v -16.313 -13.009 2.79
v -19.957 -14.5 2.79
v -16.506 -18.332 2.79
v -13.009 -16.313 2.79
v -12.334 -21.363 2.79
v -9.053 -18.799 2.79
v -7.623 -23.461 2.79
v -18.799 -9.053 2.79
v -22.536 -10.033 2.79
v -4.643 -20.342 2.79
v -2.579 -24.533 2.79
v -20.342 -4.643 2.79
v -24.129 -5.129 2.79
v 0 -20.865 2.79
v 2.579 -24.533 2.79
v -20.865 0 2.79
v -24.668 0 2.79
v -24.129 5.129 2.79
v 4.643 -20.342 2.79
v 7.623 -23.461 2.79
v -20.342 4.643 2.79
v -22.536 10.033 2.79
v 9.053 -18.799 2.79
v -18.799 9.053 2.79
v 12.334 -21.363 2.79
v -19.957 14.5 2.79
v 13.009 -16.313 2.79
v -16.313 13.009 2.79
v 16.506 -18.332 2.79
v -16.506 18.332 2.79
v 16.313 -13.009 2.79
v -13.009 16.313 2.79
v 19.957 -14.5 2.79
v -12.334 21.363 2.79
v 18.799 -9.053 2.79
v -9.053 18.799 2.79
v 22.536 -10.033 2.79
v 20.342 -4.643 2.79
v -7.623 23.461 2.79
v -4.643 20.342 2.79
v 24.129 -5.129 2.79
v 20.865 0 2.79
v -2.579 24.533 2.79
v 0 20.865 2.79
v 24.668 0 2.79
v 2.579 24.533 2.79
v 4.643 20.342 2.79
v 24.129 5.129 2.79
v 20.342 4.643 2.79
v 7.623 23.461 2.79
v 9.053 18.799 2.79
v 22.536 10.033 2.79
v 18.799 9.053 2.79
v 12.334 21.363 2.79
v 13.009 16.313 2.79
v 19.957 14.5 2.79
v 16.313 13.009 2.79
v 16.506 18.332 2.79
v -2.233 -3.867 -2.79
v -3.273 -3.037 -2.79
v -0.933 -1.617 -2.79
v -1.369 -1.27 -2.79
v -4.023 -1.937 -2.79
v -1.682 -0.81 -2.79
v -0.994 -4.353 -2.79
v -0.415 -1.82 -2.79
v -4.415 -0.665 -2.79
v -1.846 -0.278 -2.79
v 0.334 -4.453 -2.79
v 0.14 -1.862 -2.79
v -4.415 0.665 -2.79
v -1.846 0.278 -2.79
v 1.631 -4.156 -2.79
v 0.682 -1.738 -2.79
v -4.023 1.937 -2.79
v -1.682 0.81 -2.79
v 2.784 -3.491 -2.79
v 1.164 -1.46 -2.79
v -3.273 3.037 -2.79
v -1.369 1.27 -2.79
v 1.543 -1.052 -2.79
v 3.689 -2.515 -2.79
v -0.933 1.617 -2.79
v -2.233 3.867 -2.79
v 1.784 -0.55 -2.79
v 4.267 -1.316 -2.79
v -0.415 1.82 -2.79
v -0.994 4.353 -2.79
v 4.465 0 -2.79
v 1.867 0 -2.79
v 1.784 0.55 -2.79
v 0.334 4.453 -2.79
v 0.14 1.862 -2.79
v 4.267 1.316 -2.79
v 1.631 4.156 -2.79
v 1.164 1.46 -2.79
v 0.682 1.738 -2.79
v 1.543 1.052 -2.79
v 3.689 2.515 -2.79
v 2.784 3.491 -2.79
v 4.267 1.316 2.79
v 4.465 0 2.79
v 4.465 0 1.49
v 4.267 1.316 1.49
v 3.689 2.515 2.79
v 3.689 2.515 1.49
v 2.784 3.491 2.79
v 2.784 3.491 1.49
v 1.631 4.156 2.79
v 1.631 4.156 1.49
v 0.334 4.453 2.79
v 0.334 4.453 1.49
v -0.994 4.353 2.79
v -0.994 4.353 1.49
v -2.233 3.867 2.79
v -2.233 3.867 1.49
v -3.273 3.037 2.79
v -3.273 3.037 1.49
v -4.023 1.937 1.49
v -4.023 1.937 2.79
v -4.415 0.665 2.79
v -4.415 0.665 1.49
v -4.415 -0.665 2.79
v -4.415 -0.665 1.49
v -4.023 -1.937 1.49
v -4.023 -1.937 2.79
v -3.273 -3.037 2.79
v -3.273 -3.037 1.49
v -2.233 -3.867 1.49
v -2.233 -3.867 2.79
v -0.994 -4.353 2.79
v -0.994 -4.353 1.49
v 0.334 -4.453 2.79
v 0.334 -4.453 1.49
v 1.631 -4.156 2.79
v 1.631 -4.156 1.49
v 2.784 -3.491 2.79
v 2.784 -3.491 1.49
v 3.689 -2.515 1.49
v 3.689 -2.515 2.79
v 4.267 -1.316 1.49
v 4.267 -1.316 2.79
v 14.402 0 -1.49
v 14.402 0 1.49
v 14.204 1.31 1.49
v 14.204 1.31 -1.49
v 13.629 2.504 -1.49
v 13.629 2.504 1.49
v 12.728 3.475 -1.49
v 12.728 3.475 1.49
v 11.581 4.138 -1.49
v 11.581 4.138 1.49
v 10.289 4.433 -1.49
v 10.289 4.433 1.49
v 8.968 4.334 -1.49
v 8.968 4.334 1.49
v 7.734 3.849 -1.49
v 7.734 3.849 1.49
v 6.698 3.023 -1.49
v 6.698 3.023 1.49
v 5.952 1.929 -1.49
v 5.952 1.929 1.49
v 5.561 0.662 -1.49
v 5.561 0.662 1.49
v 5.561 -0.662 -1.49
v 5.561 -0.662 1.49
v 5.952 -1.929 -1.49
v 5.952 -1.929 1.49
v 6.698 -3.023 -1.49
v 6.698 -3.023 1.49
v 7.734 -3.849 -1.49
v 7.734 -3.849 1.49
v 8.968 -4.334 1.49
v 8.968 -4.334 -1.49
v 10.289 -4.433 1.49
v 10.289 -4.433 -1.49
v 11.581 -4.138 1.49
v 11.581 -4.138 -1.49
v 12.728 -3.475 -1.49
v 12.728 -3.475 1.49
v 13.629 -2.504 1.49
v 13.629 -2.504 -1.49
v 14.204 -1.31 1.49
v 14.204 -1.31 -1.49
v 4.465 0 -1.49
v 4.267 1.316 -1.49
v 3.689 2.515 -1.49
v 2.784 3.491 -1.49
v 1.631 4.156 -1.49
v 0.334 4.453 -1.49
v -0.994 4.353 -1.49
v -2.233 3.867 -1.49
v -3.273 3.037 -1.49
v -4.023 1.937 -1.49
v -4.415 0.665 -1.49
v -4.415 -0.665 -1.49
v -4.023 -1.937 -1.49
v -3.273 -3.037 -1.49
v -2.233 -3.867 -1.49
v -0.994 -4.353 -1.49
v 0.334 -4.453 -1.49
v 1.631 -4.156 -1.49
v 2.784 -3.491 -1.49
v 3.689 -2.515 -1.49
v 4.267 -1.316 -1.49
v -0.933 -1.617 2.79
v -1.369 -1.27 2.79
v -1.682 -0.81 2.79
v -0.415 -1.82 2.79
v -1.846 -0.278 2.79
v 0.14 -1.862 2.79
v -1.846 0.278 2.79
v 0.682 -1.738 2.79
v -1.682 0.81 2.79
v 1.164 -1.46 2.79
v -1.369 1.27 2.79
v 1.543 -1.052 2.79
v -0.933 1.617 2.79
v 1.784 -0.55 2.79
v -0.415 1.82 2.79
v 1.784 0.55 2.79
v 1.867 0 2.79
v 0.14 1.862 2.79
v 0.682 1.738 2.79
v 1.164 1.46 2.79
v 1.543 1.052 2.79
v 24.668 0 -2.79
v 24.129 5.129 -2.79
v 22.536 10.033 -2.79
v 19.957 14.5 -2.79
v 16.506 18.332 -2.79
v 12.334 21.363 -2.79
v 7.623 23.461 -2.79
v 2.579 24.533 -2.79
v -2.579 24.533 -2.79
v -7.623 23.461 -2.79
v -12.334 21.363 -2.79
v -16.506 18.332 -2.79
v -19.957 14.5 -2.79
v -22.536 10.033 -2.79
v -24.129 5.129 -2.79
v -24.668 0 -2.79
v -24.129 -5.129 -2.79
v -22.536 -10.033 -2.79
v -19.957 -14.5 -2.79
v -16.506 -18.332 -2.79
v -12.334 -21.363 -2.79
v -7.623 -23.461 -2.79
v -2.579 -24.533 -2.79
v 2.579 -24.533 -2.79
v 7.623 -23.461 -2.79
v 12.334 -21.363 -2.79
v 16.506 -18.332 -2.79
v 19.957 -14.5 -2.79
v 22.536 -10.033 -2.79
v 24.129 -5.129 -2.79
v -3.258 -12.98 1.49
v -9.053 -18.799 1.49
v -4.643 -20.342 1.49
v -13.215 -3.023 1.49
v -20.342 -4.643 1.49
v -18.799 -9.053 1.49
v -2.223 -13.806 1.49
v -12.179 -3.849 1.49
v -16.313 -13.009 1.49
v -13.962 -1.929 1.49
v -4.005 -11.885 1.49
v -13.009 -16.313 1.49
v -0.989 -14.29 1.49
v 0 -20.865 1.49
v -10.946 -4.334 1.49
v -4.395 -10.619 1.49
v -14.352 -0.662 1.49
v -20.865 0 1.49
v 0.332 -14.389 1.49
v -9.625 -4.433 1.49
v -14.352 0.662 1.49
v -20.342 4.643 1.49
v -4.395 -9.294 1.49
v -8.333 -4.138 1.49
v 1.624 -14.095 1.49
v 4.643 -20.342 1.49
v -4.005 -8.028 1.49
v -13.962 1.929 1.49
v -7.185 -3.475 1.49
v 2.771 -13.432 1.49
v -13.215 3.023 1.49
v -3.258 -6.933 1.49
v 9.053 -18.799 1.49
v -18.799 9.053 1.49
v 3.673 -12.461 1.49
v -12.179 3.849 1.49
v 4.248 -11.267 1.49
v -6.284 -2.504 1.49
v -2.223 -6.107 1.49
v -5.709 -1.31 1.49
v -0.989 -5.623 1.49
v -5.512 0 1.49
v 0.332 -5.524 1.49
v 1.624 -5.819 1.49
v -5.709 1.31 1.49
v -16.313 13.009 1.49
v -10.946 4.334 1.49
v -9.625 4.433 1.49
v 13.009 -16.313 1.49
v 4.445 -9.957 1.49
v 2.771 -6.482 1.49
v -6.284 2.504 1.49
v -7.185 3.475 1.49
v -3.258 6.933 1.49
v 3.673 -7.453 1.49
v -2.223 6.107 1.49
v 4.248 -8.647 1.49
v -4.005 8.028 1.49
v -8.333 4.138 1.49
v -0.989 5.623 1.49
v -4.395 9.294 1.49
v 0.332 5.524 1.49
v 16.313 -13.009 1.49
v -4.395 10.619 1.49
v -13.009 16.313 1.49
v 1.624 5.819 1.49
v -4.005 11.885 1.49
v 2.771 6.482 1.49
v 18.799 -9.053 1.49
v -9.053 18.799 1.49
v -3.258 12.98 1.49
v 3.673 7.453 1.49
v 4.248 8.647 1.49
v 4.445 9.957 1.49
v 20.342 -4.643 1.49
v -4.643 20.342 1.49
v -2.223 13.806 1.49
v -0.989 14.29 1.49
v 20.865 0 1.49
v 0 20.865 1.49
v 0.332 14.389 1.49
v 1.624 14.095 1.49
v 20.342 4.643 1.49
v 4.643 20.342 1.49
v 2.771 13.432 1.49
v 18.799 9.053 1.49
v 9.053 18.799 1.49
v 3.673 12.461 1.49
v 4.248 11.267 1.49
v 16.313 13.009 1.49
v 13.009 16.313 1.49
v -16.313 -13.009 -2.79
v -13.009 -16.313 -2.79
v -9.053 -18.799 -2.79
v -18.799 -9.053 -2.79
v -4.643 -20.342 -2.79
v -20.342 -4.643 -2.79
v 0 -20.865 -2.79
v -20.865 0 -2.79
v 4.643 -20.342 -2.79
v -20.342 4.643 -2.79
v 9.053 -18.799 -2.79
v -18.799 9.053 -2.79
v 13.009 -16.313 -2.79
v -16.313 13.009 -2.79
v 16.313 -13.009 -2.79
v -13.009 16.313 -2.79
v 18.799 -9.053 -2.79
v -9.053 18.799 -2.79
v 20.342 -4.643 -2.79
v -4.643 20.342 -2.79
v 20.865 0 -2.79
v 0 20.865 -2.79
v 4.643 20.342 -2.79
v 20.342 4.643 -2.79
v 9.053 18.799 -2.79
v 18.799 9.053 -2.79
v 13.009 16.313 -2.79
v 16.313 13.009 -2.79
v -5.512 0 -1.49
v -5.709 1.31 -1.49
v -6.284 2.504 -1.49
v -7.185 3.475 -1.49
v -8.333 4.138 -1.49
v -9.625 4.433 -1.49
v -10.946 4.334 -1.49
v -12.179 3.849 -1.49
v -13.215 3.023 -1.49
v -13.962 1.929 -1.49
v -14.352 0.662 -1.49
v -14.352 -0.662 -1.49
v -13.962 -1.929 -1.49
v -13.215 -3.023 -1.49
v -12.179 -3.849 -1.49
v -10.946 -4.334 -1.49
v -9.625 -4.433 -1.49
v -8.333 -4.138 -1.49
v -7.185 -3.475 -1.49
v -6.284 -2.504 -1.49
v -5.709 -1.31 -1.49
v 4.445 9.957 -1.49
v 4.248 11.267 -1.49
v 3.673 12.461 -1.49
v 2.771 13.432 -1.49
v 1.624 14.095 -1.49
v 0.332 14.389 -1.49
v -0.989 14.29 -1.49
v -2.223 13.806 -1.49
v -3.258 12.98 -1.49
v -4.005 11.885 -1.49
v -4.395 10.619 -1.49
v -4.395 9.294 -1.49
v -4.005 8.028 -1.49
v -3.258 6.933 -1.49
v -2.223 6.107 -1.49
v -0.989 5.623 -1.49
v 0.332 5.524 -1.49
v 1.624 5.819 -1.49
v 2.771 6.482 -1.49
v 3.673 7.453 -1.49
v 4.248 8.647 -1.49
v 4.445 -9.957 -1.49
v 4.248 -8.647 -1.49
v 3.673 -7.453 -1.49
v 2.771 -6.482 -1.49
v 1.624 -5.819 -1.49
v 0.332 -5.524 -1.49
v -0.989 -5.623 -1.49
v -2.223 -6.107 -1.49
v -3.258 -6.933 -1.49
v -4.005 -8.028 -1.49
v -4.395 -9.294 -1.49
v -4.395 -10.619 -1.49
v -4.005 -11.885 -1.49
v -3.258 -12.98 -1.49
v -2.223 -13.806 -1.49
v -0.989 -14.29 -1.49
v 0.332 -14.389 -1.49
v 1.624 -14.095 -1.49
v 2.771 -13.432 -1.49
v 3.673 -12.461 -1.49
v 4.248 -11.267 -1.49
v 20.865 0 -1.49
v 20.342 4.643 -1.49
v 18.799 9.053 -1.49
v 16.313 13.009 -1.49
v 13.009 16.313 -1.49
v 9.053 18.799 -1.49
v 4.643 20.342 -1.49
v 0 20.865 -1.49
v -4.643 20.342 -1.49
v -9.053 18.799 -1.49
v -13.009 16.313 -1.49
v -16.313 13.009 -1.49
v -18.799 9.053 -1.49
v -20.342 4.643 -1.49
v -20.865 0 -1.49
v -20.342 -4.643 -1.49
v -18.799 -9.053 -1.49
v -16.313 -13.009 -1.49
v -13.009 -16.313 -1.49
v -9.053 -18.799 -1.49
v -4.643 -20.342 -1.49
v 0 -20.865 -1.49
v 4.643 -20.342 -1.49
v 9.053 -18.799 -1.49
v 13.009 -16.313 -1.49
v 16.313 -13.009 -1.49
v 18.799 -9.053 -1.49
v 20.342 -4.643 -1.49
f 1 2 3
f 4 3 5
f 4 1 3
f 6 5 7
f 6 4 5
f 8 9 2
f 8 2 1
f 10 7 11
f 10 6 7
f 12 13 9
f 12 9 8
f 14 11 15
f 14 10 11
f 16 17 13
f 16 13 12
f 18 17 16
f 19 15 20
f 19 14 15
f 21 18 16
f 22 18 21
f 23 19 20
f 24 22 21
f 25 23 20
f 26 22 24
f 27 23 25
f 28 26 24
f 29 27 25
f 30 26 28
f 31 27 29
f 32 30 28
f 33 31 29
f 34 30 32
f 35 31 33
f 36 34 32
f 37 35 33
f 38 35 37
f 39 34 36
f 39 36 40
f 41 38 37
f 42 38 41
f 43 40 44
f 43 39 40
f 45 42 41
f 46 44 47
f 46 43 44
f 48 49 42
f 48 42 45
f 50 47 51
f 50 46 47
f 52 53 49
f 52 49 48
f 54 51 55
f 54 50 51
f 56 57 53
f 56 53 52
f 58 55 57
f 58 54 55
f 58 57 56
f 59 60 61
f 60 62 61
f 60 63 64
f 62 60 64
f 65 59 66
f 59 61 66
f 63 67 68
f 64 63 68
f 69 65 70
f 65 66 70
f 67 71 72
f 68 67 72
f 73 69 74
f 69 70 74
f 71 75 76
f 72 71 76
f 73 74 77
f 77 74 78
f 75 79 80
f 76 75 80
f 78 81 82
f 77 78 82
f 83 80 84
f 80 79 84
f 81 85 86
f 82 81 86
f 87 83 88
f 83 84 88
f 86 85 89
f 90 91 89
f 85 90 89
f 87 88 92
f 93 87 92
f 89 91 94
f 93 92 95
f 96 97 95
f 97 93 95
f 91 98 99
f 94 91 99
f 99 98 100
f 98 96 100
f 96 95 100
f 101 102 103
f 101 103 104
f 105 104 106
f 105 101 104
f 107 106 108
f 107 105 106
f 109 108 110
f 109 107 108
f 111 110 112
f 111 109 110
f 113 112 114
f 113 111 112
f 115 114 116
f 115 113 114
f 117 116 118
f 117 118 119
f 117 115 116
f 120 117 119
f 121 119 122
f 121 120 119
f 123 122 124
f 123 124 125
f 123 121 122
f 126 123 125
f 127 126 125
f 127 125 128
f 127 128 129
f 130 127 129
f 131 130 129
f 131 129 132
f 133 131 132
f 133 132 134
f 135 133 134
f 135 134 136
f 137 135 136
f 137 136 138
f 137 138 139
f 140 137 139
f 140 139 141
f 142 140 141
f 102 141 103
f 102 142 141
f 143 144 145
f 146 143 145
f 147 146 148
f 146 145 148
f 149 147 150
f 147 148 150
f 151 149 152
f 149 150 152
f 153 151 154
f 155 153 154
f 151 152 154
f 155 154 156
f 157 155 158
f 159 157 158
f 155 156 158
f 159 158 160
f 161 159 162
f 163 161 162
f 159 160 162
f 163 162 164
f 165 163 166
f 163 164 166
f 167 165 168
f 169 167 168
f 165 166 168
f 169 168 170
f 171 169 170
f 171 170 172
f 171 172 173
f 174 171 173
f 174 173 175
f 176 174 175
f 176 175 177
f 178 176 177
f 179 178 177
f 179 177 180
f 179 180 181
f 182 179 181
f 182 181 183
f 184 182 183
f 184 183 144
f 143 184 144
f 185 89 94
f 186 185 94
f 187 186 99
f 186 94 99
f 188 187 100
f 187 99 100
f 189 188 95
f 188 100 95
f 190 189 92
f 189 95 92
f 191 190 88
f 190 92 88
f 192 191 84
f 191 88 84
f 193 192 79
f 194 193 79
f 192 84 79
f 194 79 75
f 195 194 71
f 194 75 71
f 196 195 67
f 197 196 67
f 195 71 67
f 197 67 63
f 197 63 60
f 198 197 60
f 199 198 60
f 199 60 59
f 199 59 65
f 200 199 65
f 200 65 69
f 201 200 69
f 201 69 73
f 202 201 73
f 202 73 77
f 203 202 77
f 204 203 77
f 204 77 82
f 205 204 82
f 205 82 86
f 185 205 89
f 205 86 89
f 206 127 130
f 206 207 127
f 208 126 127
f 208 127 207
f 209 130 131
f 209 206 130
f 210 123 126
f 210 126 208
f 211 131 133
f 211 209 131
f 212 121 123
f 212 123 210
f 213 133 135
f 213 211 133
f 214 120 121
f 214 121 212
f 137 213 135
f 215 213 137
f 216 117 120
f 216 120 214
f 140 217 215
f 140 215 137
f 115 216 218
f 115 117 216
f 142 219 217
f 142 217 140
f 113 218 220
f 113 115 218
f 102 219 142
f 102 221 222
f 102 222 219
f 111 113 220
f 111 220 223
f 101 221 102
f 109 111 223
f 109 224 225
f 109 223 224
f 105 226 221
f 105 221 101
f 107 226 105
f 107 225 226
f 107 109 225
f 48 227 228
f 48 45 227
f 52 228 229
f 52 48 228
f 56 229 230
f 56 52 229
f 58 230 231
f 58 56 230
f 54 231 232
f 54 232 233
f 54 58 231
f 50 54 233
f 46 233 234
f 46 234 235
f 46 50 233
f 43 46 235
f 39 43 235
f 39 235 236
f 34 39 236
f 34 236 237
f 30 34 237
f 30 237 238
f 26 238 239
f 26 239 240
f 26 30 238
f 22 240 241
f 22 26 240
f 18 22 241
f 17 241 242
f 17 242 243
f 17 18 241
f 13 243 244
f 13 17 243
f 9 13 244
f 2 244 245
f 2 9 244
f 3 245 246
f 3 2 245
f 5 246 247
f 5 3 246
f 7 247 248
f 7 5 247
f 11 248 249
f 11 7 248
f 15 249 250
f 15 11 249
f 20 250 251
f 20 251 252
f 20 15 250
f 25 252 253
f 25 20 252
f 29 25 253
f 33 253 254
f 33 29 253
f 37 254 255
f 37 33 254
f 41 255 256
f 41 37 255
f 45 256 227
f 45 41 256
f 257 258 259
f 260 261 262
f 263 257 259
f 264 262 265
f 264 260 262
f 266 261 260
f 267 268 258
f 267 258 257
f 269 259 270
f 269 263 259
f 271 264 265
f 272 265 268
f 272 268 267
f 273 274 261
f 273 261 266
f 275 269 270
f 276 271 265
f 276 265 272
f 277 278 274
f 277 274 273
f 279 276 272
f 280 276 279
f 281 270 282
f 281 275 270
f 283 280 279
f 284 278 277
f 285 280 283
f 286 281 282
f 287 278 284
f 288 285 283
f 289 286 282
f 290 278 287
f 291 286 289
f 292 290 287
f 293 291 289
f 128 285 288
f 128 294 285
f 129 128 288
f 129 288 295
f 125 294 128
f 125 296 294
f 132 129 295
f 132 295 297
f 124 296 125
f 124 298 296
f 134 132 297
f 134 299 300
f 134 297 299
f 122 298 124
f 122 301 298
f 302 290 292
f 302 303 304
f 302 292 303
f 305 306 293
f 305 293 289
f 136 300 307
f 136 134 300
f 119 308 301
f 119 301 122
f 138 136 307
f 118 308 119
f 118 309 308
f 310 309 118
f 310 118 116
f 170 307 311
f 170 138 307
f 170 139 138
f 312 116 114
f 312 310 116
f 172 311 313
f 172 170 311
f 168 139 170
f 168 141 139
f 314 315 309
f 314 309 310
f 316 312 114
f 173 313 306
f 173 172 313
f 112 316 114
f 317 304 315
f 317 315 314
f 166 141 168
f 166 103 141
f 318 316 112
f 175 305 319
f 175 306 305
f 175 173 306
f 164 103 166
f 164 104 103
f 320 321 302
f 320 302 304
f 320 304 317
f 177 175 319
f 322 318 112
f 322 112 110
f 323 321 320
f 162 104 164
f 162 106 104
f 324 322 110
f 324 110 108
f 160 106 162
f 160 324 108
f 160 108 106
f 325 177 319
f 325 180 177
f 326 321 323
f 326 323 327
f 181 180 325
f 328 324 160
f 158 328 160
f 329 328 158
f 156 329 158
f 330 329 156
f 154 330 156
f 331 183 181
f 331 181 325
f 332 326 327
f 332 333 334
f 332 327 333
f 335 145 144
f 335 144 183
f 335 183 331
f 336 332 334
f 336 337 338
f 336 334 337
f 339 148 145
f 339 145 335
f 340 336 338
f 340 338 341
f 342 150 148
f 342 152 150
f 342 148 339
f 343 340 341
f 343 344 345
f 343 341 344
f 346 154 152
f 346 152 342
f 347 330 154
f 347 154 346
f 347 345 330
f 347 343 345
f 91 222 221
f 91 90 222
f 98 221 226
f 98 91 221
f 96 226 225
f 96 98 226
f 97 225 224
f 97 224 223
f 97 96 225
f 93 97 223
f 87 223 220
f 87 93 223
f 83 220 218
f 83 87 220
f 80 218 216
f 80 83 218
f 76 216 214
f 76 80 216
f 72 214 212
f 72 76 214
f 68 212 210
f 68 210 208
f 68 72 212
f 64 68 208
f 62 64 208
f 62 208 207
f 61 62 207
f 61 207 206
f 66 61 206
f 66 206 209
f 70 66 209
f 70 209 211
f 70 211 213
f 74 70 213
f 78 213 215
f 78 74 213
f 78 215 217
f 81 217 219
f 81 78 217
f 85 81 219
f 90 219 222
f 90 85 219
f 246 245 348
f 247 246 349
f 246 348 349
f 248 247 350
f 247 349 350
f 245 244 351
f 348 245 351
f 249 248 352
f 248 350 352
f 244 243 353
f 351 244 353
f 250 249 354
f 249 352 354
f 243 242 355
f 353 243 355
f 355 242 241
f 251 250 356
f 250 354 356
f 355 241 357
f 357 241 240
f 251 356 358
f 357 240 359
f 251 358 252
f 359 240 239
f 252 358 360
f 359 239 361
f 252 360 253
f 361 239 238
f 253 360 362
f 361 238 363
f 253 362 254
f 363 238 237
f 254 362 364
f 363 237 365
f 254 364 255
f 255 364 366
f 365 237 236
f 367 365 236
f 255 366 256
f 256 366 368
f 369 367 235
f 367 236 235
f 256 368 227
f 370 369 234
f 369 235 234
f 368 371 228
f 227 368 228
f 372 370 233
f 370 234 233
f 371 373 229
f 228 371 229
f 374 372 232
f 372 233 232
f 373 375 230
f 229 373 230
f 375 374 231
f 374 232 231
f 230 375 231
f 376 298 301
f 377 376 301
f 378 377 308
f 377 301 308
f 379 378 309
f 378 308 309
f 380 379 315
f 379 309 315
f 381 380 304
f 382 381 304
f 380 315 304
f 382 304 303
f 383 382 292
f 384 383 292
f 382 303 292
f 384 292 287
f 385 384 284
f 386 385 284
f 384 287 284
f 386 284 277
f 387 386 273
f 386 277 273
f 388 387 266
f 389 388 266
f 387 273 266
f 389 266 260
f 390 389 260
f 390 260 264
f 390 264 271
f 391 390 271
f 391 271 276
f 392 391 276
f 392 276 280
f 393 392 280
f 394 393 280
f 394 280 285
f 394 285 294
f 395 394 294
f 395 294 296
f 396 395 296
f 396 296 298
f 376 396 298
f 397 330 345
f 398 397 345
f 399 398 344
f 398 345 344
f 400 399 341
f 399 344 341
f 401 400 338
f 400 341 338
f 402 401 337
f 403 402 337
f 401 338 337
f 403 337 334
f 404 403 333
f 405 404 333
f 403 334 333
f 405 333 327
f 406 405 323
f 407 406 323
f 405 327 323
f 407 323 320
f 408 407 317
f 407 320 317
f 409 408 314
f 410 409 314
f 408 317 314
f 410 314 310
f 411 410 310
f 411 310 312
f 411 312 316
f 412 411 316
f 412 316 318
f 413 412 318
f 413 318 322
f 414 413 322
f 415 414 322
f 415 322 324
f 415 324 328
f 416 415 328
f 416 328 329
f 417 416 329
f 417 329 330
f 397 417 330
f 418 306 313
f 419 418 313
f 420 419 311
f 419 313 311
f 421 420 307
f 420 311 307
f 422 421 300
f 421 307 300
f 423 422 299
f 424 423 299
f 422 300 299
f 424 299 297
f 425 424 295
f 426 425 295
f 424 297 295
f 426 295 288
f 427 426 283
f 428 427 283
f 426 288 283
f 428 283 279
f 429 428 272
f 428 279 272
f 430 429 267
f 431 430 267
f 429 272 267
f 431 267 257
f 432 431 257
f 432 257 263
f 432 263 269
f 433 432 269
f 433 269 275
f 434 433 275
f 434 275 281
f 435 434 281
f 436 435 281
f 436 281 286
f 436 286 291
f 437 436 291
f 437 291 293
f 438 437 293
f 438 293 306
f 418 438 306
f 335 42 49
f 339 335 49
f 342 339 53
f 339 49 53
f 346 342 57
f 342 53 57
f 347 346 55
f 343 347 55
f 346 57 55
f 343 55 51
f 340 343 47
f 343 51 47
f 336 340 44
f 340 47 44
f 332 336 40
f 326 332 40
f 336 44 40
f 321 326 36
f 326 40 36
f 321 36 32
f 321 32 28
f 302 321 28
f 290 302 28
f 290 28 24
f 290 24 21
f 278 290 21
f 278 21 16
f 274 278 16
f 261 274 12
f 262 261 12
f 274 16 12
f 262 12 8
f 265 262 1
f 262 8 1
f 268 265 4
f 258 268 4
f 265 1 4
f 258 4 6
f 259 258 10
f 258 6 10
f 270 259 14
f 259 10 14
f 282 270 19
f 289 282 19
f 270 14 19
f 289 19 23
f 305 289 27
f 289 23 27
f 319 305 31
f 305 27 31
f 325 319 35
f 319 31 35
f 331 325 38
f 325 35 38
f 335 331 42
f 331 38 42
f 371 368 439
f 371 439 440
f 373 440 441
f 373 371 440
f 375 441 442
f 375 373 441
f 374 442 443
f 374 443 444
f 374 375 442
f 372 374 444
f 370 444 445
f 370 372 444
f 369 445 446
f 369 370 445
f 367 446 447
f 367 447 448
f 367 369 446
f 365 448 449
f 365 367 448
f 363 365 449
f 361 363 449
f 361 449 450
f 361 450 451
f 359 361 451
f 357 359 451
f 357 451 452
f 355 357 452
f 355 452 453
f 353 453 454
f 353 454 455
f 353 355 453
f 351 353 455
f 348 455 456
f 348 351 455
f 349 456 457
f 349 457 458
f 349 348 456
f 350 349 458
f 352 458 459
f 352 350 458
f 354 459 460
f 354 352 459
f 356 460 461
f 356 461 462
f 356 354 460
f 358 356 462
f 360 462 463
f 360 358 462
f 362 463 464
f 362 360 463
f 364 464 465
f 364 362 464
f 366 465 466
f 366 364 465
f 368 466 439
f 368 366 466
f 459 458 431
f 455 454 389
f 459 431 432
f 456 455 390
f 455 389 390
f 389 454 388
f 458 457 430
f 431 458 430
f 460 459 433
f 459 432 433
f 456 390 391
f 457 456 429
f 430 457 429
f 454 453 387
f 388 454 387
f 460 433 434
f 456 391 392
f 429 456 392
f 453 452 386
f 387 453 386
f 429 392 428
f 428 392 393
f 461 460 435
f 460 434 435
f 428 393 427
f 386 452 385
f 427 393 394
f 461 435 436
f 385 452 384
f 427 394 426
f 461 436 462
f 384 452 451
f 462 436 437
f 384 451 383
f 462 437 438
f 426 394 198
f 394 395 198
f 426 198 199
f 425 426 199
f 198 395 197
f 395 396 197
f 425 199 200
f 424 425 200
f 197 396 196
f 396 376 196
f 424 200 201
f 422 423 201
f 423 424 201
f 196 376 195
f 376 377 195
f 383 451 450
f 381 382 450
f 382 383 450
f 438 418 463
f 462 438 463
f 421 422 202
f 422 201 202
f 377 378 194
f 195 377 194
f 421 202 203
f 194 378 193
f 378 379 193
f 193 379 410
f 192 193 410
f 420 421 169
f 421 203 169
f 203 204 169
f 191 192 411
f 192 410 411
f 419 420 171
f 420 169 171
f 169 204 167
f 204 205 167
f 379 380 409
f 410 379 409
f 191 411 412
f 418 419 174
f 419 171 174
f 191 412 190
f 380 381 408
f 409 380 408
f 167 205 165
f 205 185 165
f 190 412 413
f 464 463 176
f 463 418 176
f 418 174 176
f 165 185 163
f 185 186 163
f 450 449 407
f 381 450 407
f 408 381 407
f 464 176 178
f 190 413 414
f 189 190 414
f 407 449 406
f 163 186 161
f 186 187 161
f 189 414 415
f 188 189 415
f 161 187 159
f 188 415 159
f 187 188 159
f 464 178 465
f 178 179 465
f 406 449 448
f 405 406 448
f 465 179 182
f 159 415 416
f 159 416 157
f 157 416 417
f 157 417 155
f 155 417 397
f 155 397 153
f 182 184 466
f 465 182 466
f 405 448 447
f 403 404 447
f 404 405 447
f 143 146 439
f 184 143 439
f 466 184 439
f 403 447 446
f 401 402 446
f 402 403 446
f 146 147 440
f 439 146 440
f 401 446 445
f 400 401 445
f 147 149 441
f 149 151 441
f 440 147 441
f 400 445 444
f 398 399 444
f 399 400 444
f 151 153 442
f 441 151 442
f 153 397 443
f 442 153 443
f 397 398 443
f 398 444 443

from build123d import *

# Parameters (mm, degrees)
SKETCH1_R           = 24.66826923
SKETCH1_R_2         = 1.8669
BOSS_EXTRUDE1_DEPTH = 2.79
SKETCH2_R           = 20.865
SKETCH2_R_2         = 4.465
CUT_EXTRUDE1_DEPTH  = 1.3
SKETCH3_R           = 4.445
CUT_EXTRUDE2_DEPTH  = 36.147765414


with BuildPart() as part:
    # Sketch1 → Boss-Extrude1 (new, symmetric)
    with BuildSketch(Plane.XY):
        Circle(SKETCH1_R)
        Circle(SKETCH1_R_2, mode=Mode.SUBTRACT)
    extrude(amount=BOSS_EXTRUDE1_DEPTH, both=True)

    # Sketch2 → Cut-Extrude1 (cut)
    with BuildSketch(Plane.XY.offset(2.79)):
        Circle(SKETCH2_R)
        Circle(SKETCH2_R_2, mode=Mode.SUBTRACT)
    cut_extrude1 = extrude(amount=-CUT_EXTRUDE1_DEPTH, mode=Mode.SUBTRACT)

    # Sketch3 → Cut-Extrude2 (cut, through all)
    with BuildSketch(Plane.XY.offset(1.49)):
        with Locations((0, 9.9568)):
            Circle(SKETCH3_R)
        with Locations((9.9568, 0)):
            Circle(SKETCH3_R)
        with Locations((0, -9.9568)):
            Circle(SKETCH3_R)
        with Locations((-9.9568, 0)):
            Circle(SKETCH3_R)
    extrude(amount=-CUT_EXTRUDE2_DEPTH, mode=Mode.SUBTRACT)

    # Mirror1: Cut-Extrude1 across plane
    add(cut_extrude1.mirror(Plane.XY), mode=Mode.SUBTRACT)


solid = part.part
